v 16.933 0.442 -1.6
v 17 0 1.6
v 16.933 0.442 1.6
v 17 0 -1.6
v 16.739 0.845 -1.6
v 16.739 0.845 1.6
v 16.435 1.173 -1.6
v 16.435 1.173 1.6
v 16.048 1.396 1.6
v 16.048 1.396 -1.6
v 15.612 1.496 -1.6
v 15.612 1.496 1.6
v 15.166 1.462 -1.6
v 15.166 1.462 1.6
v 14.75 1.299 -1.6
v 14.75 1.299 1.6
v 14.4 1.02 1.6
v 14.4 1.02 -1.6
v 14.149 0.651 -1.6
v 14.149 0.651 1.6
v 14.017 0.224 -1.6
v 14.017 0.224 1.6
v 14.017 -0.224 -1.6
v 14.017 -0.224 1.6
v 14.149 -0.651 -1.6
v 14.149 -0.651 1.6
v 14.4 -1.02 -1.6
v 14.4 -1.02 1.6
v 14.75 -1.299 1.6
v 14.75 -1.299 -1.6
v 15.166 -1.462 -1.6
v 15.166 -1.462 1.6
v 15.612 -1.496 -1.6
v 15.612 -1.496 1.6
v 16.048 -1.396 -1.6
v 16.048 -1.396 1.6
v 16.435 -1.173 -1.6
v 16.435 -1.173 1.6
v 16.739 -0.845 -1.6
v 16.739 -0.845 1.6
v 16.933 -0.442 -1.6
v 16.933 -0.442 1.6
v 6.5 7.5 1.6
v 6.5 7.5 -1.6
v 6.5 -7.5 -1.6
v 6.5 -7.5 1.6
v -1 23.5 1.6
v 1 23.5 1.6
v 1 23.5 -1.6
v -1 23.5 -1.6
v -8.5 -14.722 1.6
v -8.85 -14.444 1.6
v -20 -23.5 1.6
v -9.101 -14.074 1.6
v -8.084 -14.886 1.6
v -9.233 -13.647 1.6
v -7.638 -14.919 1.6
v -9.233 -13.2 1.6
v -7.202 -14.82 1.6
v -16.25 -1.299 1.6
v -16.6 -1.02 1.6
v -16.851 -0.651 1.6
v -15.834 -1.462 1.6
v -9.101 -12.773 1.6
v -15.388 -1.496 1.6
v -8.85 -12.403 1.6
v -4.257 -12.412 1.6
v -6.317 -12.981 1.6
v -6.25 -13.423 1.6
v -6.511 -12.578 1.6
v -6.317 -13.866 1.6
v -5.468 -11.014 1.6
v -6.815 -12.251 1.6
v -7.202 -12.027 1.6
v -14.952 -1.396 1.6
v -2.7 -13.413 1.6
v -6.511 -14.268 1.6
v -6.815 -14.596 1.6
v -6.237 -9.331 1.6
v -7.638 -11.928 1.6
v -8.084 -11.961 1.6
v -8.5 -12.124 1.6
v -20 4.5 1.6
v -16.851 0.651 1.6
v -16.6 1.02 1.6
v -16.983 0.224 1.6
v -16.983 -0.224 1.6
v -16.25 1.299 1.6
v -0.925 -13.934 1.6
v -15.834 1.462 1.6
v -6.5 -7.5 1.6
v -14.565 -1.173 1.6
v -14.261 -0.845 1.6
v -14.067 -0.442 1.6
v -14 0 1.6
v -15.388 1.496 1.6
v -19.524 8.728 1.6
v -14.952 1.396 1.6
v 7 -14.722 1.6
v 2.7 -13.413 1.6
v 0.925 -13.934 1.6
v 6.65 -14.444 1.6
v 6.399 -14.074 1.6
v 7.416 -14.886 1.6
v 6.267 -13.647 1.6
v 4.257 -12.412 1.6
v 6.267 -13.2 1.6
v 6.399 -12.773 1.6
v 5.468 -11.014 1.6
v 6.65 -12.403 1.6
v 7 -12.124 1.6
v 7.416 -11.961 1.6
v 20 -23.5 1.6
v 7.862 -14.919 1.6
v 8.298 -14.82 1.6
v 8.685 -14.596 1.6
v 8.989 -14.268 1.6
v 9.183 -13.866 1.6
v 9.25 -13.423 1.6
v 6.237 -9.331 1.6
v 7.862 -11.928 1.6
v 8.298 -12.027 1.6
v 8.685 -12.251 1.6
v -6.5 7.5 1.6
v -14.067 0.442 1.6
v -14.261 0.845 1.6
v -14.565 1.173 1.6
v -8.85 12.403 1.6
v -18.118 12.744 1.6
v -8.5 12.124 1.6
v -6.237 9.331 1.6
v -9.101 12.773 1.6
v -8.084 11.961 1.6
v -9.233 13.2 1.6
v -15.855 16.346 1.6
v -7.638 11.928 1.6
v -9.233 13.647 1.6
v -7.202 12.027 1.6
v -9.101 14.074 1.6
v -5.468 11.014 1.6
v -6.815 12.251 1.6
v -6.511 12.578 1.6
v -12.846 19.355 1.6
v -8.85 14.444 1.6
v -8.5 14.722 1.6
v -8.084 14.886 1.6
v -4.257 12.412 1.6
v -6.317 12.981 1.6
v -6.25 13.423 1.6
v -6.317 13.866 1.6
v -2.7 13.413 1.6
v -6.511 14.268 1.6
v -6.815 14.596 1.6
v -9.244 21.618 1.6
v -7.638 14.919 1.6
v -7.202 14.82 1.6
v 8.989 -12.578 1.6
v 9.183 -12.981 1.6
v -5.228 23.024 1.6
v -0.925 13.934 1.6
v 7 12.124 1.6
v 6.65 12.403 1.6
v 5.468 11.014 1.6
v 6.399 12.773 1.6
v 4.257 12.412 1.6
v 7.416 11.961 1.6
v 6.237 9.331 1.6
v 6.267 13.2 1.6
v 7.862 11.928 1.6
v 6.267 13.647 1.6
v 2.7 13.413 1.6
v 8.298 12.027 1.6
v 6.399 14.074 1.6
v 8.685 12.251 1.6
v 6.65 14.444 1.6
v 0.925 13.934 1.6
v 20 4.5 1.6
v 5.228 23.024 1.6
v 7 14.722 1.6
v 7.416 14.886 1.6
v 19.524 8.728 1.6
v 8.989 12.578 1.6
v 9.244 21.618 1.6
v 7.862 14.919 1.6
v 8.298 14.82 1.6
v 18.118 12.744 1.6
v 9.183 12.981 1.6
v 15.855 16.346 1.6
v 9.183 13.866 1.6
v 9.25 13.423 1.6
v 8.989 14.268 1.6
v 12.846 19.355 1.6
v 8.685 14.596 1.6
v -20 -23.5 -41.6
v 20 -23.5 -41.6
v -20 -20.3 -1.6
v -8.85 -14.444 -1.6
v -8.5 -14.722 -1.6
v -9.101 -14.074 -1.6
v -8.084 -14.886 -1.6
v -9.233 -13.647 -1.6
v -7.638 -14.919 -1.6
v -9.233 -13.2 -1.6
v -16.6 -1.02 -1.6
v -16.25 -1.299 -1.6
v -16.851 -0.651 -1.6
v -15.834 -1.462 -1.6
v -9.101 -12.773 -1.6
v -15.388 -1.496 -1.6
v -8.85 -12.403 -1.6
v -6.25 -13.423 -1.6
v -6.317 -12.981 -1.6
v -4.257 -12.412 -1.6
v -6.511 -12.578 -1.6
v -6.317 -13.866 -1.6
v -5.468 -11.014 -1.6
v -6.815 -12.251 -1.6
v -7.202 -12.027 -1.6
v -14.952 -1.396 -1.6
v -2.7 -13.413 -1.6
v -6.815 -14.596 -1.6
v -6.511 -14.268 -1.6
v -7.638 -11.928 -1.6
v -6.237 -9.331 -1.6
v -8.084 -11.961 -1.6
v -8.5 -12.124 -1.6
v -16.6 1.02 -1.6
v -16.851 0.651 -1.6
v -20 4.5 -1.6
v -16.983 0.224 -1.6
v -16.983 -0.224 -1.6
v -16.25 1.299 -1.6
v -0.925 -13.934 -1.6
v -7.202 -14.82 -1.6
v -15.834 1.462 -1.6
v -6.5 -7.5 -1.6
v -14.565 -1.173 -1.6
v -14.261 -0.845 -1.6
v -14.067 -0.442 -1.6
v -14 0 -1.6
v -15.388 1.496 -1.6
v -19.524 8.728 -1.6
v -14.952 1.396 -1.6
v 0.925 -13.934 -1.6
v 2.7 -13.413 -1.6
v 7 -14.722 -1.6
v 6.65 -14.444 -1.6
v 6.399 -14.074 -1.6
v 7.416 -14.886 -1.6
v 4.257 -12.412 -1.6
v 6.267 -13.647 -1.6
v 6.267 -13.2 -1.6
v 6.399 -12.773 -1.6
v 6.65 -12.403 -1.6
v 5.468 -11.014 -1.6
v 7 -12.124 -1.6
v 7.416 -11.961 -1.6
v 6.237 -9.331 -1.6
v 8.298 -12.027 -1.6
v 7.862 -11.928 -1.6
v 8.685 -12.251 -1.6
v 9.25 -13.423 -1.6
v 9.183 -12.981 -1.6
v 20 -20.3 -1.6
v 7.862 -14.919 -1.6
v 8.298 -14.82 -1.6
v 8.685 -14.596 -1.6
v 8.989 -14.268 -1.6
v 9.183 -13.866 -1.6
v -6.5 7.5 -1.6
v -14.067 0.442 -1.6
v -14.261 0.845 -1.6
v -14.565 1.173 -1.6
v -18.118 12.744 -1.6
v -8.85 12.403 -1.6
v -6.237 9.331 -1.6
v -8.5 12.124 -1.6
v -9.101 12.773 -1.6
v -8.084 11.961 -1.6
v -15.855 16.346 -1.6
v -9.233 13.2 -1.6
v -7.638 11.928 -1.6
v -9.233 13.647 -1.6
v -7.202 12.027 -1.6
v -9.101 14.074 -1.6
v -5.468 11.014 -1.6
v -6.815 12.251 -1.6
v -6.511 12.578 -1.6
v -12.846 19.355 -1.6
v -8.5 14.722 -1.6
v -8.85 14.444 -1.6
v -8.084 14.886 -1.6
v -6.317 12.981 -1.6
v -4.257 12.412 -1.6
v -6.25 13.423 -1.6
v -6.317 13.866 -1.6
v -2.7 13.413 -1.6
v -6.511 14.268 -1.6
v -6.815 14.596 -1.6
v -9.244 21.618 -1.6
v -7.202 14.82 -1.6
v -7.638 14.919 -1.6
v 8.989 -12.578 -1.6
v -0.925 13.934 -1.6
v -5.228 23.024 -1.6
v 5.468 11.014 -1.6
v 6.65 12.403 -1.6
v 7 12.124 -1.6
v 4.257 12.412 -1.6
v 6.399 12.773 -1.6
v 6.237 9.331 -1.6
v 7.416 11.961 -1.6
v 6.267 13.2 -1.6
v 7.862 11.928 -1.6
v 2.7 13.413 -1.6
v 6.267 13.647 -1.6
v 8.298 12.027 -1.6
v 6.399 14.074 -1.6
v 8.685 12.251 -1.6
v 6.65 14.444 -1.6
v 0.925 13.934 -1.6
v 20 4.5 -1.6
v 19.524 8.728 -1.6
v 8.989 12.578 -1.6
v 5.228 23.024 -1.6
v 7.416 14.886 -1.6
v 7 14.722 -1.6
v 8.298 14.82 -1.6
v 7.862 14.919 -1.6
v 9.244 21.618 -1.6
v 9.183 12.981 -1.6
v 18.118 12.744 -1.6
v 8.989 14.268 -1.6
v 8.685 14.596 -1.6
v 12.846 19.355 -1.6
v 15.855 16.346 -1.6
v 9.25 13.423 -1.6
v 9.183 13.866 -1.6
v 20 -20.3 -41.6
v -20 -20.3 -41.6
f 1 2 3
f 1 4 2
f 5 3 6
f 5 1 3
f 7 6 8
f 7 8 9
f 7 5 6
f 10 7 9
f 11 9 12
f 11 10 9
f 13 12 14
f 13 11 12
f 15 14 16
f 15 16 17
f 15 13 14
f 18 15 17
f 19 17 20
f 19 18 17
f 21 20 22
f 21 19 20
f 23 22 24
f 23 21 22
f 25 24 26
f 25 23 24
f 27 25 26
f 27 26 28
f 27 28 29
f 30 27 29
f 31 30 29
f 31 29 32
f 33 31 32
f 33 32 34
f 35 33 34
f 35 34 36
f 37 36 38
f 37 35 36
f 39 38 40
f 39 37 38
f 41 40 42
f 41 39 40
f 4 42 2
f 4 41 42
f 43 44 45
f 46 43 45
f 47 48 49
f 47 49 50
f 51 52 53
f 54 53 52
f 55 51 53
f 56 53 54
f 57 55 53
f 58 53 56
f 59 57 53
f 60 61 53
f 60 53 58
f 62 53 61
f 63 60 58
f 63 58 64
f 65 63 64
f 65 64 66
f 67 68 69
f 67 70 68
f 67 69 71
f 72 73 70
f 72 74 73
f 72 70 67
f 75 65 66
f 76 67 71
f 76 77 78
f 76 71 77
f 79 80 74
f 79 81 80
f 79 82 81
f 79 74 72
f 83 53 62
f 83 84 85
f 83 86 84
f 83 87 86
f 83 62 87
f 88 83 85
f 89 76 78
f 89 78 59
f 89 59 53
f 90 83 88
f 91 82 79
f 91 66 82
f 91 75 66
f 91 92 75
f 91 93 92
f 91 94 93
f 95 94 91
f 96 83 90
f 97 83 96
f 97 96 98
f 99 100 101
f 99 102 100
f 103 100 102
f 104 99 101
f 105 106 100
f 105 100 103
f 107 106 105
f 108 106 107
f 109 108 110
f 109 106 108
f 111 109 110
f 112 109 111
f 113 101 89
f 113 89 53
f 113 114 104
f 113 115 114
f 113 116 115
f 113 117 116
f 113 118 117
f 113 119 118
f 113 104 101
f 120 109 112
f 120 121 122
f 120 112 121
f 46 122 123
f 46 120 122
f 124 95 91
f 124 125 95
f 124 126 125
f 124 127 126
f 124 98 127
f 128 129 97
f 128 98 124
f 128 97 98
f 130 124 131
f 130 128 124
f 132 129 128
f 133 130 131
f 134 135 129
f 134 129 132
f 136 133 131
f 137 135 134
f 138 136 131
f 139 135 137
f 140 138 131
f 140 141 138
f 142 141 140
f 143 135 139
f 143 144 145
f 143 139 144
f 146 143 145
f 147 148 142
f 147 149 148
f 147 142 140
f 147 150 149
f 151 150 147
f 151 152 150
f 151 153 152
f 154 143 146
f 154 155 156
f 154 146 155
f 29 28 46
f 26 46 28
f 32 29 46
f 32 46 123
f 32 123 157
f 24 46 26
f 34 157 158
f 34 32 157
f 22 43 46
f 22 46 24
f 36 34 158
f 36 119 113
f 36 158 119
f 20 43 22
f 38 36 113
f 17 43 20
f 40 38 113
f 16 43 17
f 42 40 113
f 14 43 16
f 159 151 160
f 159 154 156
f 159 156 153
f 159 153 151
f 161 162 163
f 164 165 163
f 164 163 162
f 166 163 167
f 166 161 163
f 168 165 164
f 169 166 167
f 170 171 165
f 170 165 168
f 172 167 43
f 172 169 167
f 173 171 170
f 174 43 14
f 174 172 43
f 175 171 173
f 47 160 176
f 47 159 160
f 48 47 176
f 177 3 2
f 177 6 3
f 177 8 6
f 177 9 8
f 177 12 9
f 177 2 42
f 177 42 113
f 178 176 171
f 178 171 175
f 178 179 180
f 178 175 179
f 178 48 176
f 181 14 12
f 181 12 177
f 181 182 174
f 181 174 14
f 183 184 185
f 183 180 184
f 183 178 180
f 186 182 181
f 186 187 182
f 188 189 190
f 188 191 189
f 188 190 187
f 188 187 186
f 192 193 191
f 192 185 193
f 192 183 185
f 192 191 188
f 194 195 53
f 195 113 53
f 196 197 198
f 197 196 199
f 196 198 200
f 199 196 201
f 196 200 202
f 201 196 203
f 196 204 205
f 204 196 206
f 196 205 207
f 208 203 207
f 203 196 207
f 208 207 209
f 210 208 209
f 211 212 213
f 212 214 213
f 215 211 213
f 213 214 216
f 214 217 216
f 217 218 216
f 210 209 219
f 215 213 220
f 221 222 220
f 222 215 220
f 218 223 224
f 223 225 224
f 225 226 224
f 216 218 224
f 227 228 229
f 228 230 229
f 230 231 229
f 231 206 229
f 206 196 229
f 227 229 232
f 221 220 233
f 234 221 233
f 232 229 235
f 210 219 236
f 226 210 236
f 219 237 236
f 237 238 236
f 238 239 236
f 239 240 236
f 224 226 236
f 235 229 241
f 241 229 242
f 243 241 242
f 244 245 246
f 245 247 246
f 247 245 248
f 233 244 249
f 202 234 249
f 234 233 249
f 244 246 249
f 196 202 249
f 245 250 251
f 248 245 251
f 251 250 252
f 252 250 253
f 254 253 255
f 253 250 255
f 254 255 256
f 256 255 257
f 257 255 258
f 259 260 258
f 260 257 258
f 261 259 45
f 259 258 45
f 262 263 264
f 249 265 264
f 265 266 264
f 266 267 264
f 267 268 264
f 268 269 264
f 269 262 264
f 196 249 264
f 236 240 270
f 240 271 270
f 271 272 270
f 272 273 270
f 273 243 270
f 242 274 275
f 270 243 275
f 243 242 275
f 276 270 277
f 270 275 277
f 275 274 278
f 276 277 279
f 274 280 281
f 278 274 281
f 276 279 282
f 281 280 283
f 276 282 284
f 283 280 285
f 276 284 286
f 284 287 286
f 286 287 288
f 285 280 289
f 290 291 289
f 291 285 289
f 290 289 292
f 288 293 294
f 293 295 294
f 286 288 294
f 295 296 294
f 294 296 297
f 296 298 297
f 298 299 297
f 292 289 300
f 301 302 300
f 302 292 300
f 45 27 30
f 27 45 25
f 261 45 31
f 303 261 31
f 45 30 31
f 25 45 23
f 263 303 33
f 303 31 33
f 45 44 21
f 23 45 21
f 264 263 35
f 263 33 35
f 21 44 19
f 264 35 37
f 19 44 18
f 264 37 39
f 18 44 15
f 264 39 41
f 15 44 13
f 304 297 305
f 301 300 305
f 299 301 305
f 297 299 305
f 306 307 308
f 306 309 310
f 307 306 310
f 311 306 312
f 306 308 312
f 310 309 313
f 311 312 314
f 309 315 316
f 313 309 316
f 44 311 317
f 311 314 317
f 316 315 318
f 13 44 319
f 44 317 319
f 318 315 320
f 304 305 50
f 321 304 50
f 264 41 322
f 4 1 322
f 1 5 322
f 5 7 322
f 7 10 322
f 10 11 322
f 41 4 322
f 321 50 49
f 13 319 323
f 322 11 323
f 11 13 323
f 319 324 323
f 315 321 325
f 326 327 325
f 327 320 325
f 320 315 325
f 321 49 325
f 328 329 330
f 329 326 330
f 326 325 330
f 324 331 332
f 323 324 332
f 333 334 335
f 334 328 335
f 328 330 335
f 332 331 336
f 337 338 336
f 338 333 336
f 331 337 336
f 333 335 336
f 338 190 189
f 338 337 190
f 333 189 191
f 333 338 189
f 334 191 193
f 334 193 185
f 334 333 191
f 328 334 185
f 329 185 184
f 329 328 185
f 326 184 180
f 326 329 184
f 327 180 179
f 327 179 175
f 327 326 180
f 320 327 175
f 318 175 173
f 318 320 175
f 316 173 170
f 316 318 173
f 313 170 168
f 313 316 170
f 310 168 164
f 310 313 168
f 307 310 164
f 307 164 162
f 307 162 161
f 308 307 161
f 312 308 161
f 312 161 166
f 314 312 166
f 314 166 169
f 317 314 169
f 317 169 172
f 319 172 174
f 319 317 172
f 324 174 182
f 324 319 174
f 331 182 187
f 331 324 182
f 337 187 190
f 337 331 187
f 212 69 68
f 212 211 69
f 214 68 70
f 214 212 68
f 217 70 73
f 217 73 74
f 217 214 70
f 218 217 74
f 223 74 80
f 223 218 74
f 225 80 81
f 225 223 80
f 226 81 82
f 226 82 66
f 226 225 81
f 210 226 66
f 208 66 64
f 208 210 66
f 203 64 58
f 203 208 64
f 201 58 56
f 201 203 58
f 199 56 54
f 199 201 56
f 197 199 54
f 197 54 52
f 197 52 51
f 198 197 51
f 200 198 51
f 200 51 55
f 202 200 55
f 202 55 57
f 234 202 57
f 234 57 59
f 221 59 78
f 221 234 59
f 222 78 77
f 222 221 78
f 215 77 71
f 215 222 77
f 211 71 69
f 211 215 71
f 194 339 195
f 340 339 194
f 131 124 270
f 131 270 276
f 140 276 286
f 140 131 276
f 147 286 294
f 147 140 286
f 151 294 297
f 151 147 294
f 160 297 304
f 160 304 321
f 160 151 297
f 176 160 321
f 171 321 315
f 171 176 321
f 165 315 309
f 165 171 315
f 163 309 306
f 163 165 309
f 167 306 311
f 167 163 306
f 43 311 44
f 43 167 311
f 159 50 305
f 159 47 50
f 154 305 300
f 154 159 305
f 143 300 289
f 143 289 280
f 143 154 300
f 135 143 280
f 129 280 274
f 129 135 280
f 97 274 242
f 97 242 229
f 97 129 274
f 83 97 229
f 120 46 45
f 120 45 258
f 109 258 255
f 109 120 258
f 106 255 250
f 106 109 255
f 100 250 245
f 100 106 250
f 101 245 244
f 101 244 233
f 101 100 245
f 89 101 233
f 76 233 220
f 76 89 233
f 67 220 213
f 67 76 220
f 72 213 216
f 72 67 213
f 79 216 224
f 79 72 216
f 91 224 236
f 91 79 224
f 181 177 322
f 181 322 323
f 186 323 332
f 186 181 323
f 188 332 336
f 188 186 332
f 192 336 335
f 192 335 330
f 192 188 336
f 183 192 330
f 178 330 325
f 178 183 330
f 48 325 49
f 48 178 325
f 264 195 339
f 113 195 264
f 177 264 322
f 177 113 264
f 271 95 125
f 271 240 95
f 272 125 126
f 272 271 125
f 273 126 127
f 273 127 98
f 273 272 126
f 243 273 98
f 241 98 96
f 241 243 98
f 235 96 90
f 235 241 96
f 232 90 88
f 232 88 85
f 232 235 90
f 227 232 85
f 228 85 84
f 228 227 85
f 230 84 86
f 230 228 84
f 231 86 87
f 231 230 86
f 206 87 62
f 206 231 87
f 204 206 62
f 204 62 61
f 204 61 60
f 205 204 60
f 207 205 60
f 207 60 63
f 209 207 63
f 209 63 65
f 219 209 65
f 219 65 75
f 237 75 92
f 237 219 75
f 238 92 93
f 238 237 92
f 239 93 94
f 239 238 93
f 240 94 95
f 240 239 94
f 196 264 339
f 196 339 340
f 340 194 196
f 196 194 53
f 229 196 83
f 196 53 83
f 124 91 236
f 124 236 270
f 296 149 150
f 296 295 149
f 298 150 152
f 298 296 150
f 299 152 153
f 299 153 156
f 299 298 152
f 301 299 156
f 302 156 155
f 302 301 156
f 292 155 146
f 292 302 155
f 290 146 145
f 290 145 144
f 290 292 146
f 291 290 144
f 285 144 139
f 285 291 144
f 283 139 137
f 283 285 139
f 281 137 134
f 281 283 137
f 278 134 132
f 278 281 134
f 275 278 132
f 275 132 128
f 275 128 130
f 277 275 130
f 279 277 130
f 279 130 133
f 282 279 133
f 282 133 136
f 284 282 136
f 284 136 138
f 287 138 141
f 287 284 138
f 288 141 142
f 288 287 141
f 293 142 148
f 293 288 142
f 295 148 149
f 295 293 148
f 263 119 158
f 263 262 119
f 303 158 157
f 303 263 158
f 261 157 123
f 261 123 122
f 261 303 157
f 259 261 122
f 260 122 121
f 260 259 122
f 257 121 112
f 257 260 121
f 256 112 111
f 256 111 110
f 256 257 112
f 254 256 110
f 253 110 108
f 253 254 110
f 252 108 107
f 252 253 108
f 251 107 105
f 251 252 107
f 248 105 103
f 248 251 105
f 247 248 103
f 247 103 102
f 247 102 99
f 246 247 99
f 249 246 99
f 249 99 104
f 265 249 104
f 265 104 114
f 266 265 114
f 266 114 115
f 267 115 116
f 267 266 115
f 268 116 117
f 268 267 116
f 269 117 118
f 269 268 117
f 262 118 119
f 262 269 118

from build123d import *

# Parameters (mm, degrees)
CROQUIS1_R              = 1.5
SALIENTE_EXTRUIR1_DEPTH = 1.6
CROQUIS2_W              = 40
CROQUIS2_H              = 3.2
SALIENTE_EXTRUIR2_DEPTH = 40


with BuildPart() as part:
    # Croquis1 → Saliente-Extruir1 (new, symmetric)
    with BuildSketch(Plane.XY):
        with BuildLine():
            Line((-20, -23.5), (20, -23.5))
            Line((20, -23.5), (20, 4.5))
            ThreePointArc((20, 4.5), (14.435028843, 17.935028843), (1, 23.5))
            Line((1, 23.5), (-1, 23.5))
            ThreePointArc((-1, 23.5), (-14.435028843, 17.935028843), (-20, 4.5))
            Line((-20, 4.5), (-20, -23.5))
        make_face()
        with Locations((-15.5, 0)):
            Circle(CROQUIS1_R, mode=Mode.SUBTRACT)
        with Locations((-7.75, 13.423393759)):
            Circle(CROQUIS1_R, mode=Mode.SUBTRACT)
        with Locations((7.75, 13.423393759)):
            Circle(CROQUIS1_R, mode=Mode.SUBTRACT)
        with Locations((15.5, 0)):
            Circle(CROQUIS1_R, mode=Mode.SUBTRACT)
        with Locations((7.75, -13.423393759)):
            Circle(CROQUIS1_R, mode=Mode.SUBTRACT)
        with Locations((-7.75, -13.423393759)):
            Circle(CROQUIS1_R, mode=Mode.SUBTRACT)
        with BuildLine():
            Line((6.5, 7.5), (6.5, -7.5))
            ThreePointArc((6.5, -7.5), (0, -14), (-6.5, -7.5))
            Line((-6.5, -7.5), (-6.5, 7.5))
            ThreePointArc((-6.5, 7.5), (0, 14), (6.5, 7.5))
        make_face(mode=Mode.SUBTRACT)
    extrude(amount=SALIENTE_EXTRUIR1_DEPTH, both=True)

    # Croquis2 → Saliente-Extruir2 (add)
    with BuildSketch(Plane(origin=(0, 0, -1.6), x_dir=(-1, 0, 0), z_dir=(0, 0, -1))):
        with Locations((0, -21.9)):
            Rectangle(CROQUIS2_W, CROQUIS2_H)
    extrude(amount=SALIENTE_EXTRUIR2_DEPTH)


solid = part.part
